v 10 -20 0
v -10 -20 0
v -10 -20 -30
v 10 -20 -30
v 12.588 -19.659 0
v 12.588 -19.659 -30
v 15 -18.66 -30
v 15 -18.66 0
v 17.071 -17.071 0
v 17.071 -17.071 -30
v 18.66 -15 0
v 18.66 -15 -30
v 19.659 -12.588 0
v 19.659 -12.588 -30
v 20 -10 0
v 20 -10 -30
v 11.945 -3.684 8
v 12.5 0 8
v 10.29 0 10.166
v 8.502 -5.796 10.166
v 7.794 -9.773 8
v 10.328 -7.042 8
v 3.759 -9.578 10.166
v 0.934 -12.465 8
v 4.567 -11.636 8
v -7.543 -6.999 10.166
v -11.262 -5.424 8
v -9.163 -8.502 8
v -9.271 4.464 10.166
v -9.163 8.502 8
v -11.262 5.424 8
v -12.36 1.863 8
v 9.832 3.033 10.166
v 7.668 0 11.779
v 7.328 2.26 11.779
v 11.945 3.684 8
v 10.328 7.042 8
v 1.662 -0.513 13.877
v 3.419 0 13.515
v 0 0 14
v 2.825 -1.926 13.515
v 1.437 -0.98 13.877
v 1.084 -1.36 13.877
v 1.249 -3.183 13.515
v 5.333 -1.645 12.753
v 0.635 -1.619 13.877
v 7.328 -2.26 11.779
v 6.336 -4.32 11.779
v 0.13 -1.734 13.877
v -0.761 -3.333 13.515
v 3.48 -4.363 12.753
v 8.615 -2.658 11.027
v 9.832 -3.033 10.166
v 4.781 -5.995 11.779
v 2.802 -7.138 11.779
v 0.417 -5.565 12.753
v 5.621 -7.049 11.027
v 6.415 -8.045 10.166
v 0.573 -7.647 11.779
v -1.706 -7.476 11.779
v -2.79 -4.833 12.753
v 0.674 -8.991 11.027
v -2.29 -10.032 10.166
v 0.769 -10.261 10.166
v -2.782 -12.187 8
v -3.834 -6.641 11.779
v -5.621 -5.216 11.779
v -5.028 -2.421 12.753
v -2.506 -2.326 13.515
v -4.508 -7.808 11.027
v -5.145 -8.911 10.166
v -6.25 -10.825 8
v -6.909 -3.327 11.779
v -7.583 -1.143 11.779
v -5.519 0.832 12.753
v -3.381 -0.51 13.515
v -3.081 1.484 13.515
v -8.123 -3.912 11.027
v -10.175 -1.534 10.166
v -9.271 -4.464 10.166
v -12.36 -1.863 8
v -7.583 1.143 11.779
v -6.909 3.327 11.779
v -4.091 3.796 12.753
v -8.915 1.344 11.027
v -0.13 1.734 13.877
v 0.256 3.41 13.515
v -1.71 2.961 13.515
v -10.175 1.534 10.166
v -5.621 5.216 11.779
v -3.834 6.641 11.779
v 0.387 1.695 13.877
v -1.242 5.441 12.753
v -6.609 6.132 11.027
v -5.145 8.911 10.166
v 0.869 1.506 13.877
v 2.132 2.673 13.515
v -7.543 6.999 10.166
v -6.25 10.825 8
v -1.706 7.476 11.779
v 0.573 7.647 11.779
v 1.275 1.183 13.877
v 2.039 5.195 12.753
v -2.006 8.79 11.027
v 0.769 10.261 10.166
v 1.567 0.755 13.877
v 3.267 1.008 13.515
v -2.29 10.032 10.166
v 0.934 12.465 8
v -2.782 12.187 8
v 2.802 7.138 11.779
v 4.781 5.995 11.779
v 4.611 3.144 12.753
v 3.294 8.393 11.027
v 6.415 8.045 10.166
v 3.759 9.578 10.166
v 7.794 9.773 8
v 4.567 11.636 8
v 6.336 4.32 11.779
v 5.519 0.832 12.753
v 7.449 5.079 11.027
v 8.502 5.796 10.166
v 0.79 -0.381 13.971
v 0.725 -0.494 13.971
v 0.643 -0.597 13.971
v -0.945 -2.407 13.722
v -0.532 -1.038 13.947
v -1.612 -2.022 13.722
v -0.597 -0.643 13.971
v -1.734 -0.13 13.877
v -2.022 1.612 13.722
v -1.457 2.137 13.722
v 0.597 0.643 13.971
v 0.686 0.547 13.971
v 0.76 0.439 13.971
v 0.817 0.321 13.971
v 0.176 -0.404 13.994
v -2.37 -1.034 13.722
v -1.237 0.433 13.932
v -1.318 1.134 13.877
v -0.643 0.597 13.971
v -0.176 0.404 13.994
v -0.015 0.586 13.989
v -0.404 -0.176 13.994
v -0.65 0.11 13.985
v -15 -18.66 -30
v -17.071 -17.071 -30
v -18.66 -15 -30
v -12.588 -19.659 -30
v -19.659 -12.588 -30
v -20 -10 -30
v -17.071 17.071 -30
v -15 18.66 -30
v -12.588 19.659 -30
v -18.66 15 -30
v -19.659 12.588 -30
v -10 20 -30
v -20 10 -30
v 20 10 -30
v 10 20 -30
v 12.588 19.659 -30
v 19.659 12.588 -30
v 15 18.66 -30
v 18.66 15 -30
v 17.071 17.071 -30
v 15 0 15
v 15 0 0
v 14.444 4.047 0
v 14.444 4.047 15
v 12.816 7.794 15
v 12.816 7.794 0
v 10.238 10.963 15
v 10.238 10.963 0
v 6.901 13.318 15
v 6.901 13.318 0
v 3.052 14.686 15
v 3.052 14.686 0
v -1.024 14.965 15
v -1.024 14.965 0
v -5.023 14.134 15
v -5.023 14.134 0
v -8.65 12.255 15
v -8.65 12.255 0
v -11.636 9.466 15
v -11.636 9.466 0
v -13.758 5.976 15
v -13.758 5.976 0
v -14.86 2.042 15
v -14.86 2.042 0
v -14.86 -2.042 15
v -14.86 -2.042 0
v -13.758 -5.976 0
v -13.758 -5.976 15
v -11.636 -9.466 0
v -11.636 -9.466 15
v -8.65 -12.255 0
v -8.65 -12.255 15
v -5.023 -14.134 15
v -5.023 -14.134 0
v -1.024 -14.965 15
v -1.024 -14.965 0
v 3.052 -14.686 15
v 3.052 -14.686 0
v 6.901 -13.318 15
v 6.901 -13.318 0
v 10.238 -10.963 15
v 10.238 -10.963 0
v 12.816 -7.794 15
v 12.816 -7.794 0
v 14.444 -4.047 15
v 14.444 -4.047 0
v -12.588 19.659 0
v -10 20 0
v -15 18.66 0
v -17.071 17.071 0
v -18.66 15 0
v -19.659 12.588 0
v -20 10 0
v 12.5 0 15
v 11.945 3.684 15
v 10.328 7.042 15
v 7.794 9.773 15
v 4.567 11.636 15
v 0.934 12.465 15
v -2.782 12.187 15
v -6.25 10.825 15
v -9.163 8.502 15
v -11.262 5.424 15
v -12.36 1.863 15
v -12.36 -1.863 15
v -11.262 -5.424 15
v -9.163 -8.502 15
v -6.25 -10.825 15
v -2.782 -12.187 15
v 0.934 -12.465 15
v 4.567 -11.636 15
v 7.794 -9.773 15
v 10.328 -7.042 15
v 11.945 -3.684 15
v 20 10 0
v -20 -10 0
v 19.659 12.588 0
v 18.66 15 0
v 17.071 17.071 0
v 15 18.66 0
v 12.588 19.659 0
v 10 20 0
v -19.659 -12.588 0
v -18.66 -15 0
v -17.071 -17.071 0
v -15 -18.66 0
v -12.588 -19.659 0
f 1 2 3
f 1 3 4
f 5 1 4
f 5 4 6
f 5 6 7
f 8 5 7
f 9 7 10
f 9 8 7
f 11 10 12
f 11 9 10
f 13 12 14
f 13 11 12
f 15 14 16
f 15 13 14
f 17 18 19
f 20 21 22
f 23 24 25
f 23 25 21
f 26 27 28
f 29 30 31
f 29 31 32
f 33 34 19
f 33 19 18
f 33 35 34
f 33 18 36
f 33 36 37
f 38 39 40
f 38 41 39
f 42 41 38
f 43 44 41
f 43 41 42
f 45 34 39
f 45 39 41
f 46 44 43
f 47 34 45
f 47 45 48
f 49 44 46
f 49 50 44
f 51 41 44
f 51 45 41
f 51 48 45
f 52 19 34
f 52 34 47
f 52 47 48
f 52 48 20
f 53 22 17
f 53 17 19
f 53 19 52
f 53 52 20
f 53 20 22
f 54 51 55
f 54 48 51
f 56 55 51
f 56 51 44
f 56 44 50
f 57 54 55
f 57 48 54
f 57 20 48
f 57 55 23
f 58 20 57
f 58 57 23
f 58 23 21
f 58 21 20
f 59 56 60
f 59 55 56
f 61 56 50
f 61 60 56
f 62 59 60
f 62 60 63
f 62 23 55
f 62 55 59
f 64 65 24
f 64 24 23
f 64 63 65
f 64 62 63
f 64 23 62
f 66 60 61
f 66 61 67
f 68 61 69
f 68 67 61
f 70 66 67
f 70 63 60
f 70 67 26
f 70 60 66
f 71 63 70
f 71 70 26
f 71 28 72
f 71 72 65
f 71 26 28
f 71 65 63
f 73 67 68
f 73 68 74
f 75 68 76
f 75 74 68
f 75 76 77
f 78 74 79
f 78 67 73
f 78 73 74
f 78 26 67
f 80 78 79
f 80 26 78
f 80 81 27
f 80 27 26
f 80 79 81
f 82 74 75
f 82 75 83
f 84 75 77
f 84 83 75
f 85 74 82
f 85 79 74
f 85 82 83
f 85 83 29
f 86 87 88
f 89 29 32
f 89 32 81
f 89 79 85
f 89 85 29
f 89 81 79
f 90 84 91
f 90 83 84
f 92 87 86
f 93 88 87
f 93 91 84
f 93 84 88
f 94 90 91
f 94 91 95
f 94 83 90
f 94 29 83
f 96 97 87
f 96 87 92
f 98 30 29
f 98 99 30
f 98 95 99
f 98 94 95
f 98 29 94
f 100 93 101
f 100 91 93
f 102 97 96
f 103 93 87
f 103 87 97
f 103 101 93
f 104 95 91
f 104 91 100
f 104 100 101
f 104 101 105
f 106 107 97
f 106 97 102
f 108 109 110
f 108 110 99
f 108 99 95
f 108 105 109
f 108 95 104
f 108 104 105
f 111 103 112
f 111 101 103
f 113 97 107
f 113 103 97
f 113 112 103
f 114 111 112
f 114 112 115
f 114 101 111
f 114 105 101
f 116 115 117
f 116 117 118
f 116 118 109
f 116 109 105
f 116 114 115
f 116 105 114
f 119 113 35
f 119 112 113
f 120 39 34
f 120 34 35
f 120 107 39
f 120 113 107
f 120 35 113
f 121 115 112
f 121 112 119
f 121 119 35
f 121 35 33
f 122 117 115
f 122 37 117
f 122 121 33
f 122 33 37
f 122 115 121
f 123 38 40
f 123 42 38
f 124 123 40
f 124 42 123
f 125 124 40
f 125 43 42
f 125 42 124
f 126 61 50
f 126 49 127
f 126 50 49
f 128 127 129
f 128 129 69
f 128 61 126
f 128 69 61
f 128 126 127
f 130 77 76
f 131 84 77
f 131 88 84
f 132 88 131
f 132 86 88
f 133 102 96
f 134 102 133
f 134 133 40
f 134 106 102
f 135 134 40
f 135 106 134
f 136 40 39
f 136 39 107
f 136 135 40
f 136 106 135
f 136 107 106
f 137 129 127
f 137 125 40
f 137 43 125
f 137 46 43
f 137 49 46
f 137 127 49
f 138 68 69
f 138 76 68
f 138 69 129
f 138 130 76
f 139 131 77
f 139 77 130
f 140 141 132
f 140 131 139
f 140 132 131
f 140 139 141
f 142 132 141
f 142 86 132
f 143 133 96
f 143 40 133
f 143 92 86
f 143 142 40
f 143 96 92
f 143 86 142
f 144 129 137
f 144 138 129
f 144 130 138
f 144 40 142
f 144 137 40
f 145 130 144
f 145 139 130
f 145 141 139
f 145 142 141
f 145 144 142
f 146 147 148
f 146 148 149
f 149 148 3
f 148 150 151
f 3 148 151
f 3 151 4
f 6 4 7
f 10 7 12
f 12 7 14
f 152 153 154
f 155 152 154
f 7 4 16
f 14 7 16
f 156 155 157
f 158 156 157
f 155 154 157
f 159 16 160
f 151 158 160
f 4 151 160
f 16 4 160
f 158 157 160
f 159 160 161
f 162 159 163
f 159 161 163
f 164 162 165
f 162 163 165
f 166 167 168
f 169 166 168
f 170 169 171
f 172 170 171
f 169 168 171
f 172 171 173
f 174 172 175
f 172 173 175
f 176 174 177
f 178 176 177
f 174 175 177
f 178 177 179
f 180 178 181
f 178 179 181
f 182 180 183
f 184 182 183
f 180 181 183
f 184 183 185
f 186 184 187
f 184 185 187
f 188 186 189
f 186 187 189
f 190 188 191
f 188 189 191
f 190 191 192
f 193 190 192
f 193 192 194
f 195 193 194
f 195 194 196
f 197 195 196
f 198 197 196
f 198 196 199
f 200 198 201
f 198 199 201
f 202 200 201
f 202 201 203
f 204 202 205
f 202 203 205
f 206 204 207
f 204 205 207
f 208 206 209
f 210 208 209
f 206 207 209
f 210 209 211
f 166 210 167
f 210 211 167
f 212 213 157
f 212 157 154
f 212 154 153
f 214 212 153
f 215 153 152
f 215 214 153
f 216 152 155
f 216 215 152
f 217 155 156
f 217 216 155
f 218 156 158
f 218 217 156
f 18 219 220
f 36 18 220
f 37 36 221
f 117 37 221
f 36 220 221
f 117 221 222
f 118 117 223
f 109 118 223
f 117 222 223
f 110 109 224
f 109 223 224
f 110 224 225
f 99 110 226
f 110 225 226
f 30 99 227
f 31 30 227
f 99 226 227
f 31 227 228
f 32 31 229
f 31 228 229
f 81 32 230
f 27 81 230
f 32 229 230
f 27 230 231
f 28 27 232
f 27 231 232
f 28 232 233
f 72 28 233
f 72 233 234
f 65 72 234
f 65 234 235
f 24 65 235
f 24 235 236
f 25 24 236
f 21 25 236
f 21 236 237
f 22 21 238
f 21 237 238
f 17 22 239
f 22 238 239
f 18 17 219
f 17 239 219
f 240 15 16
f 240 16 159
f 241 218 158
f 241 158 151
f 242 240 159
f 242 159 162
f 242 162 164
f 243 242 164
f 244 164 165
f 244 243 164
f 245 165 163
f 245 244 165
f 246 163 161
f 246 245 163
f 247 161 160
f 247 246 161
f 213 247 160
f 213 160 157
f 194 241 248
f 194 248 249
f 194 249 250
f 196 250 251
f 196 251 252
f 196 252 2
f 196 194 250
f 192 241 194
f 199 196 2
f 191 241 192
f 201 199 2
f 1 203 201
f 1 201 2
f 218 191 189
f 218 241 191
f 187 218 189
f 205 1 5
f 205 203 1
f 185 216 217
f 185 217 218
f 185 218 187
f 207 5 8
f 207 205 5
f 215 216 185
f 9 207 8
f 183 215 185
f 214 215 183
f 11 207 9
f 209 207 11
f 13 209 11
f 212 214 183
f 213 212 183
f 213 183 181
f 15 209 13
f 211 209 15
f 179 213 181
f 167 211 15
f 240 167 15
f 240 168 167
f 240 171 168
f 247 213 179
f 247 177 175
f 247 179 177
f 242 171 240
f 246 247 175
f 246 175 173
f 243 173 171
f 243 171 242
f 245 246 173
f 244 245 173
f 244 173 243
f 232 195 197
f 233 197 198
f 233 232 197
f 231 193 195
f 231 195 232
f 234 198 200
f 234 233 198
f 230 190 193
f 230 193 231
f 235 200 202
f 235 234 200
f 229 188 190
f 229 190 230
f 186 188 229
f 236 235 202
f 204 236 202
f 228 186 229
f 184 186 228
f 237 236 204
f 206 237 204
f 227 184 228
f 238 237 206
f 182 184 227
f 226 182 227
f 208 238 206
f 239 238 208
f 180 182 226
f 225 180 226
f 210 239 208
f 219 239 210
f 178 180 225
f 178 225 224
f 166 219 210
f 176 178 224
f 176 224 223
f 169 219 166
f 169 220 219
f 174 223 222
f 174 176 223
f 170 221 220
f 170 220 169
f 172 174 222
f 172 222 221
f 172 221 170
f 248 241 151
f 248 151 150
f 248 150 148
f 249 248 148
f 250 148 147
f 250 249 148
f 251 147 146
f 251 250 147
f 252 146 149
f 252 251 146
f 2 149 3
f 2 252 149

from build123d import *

# Parameters (mm, degrees)
EXTRUDE_1_DEPTH     = 30
SKETCH_2_R          = 15
EXTRUDE_2_DEPTH     = 15
SKETCH_3_R          = 12.5
CUT_EXTRUDE_1_DEPTH = 7


with BuildPart() as part:
    # 草图1 → 凸台-拉伸1 (new body)
    with BuildSketch(Plane.XY):
        with BuildLine():
            Line((-10, -20), (10, -20))
            ThreePointArc((10, -20), (17.071067812, -17.071067812), (20, -10))
            Line((20, -10), (20, 10))
            ThreePointArc((20, 10), (17.071067812, 17.071067812), (10, 20))
            Line((10, 20), (-10, 20))
            ThreePointArc((-10, 20), (-17.071067812, 17.071067812), (-20, 10))
            Line((-20, 10), (-20, -10))
            ThreePointArc((-20, -10), (-17.071067812, -17.071067812), (-10, -20))
        make_face()
    extrude(amount=-EXTRUDE_1_DEPTH)

    # 草图2 → 凸台-拉伸2 (add)
    with BuildSketch(Plane.XY):
        Circle(SKETCH_2_R)
    extrude(amount=EXTRUDE_2_DEPTH)

    # 草图3 → 切除-拉伸1 (cut)
    with BuildSketch(Plane.XY.offset(15)):
        Circle(SKETCH_3_R)
    extrude(amount=-CUT_EXTRUDE_1_DEPTH, mode=Mode.SUBTRACT)

    # 草图4 → 旋转1 (revolve)
    with BuildSketch(Plane(origin=(0, 0, 0), x_dir=(1, 0, 0), z_dir=(0, 1, 0))):
        with BuildLine():
            Line((0, -8), (12.5, -8))
            add(Edge.make_bspline(
                [(0, -14), (2.433971775, -14.017624523), (6.926016956, -12.41143597), (11.019102747, -9.936800199), (12.5, -8)],
                knots=[0, 0, 0, 0, 0.499949421, 1, 1, 1, 1], degree=3))
            Line((0, -14), (0, -8))
        make_face()
    revolve(axis=Axis((0, 0, 20.621681052), (0, 0, -1)))


solid = part.part
